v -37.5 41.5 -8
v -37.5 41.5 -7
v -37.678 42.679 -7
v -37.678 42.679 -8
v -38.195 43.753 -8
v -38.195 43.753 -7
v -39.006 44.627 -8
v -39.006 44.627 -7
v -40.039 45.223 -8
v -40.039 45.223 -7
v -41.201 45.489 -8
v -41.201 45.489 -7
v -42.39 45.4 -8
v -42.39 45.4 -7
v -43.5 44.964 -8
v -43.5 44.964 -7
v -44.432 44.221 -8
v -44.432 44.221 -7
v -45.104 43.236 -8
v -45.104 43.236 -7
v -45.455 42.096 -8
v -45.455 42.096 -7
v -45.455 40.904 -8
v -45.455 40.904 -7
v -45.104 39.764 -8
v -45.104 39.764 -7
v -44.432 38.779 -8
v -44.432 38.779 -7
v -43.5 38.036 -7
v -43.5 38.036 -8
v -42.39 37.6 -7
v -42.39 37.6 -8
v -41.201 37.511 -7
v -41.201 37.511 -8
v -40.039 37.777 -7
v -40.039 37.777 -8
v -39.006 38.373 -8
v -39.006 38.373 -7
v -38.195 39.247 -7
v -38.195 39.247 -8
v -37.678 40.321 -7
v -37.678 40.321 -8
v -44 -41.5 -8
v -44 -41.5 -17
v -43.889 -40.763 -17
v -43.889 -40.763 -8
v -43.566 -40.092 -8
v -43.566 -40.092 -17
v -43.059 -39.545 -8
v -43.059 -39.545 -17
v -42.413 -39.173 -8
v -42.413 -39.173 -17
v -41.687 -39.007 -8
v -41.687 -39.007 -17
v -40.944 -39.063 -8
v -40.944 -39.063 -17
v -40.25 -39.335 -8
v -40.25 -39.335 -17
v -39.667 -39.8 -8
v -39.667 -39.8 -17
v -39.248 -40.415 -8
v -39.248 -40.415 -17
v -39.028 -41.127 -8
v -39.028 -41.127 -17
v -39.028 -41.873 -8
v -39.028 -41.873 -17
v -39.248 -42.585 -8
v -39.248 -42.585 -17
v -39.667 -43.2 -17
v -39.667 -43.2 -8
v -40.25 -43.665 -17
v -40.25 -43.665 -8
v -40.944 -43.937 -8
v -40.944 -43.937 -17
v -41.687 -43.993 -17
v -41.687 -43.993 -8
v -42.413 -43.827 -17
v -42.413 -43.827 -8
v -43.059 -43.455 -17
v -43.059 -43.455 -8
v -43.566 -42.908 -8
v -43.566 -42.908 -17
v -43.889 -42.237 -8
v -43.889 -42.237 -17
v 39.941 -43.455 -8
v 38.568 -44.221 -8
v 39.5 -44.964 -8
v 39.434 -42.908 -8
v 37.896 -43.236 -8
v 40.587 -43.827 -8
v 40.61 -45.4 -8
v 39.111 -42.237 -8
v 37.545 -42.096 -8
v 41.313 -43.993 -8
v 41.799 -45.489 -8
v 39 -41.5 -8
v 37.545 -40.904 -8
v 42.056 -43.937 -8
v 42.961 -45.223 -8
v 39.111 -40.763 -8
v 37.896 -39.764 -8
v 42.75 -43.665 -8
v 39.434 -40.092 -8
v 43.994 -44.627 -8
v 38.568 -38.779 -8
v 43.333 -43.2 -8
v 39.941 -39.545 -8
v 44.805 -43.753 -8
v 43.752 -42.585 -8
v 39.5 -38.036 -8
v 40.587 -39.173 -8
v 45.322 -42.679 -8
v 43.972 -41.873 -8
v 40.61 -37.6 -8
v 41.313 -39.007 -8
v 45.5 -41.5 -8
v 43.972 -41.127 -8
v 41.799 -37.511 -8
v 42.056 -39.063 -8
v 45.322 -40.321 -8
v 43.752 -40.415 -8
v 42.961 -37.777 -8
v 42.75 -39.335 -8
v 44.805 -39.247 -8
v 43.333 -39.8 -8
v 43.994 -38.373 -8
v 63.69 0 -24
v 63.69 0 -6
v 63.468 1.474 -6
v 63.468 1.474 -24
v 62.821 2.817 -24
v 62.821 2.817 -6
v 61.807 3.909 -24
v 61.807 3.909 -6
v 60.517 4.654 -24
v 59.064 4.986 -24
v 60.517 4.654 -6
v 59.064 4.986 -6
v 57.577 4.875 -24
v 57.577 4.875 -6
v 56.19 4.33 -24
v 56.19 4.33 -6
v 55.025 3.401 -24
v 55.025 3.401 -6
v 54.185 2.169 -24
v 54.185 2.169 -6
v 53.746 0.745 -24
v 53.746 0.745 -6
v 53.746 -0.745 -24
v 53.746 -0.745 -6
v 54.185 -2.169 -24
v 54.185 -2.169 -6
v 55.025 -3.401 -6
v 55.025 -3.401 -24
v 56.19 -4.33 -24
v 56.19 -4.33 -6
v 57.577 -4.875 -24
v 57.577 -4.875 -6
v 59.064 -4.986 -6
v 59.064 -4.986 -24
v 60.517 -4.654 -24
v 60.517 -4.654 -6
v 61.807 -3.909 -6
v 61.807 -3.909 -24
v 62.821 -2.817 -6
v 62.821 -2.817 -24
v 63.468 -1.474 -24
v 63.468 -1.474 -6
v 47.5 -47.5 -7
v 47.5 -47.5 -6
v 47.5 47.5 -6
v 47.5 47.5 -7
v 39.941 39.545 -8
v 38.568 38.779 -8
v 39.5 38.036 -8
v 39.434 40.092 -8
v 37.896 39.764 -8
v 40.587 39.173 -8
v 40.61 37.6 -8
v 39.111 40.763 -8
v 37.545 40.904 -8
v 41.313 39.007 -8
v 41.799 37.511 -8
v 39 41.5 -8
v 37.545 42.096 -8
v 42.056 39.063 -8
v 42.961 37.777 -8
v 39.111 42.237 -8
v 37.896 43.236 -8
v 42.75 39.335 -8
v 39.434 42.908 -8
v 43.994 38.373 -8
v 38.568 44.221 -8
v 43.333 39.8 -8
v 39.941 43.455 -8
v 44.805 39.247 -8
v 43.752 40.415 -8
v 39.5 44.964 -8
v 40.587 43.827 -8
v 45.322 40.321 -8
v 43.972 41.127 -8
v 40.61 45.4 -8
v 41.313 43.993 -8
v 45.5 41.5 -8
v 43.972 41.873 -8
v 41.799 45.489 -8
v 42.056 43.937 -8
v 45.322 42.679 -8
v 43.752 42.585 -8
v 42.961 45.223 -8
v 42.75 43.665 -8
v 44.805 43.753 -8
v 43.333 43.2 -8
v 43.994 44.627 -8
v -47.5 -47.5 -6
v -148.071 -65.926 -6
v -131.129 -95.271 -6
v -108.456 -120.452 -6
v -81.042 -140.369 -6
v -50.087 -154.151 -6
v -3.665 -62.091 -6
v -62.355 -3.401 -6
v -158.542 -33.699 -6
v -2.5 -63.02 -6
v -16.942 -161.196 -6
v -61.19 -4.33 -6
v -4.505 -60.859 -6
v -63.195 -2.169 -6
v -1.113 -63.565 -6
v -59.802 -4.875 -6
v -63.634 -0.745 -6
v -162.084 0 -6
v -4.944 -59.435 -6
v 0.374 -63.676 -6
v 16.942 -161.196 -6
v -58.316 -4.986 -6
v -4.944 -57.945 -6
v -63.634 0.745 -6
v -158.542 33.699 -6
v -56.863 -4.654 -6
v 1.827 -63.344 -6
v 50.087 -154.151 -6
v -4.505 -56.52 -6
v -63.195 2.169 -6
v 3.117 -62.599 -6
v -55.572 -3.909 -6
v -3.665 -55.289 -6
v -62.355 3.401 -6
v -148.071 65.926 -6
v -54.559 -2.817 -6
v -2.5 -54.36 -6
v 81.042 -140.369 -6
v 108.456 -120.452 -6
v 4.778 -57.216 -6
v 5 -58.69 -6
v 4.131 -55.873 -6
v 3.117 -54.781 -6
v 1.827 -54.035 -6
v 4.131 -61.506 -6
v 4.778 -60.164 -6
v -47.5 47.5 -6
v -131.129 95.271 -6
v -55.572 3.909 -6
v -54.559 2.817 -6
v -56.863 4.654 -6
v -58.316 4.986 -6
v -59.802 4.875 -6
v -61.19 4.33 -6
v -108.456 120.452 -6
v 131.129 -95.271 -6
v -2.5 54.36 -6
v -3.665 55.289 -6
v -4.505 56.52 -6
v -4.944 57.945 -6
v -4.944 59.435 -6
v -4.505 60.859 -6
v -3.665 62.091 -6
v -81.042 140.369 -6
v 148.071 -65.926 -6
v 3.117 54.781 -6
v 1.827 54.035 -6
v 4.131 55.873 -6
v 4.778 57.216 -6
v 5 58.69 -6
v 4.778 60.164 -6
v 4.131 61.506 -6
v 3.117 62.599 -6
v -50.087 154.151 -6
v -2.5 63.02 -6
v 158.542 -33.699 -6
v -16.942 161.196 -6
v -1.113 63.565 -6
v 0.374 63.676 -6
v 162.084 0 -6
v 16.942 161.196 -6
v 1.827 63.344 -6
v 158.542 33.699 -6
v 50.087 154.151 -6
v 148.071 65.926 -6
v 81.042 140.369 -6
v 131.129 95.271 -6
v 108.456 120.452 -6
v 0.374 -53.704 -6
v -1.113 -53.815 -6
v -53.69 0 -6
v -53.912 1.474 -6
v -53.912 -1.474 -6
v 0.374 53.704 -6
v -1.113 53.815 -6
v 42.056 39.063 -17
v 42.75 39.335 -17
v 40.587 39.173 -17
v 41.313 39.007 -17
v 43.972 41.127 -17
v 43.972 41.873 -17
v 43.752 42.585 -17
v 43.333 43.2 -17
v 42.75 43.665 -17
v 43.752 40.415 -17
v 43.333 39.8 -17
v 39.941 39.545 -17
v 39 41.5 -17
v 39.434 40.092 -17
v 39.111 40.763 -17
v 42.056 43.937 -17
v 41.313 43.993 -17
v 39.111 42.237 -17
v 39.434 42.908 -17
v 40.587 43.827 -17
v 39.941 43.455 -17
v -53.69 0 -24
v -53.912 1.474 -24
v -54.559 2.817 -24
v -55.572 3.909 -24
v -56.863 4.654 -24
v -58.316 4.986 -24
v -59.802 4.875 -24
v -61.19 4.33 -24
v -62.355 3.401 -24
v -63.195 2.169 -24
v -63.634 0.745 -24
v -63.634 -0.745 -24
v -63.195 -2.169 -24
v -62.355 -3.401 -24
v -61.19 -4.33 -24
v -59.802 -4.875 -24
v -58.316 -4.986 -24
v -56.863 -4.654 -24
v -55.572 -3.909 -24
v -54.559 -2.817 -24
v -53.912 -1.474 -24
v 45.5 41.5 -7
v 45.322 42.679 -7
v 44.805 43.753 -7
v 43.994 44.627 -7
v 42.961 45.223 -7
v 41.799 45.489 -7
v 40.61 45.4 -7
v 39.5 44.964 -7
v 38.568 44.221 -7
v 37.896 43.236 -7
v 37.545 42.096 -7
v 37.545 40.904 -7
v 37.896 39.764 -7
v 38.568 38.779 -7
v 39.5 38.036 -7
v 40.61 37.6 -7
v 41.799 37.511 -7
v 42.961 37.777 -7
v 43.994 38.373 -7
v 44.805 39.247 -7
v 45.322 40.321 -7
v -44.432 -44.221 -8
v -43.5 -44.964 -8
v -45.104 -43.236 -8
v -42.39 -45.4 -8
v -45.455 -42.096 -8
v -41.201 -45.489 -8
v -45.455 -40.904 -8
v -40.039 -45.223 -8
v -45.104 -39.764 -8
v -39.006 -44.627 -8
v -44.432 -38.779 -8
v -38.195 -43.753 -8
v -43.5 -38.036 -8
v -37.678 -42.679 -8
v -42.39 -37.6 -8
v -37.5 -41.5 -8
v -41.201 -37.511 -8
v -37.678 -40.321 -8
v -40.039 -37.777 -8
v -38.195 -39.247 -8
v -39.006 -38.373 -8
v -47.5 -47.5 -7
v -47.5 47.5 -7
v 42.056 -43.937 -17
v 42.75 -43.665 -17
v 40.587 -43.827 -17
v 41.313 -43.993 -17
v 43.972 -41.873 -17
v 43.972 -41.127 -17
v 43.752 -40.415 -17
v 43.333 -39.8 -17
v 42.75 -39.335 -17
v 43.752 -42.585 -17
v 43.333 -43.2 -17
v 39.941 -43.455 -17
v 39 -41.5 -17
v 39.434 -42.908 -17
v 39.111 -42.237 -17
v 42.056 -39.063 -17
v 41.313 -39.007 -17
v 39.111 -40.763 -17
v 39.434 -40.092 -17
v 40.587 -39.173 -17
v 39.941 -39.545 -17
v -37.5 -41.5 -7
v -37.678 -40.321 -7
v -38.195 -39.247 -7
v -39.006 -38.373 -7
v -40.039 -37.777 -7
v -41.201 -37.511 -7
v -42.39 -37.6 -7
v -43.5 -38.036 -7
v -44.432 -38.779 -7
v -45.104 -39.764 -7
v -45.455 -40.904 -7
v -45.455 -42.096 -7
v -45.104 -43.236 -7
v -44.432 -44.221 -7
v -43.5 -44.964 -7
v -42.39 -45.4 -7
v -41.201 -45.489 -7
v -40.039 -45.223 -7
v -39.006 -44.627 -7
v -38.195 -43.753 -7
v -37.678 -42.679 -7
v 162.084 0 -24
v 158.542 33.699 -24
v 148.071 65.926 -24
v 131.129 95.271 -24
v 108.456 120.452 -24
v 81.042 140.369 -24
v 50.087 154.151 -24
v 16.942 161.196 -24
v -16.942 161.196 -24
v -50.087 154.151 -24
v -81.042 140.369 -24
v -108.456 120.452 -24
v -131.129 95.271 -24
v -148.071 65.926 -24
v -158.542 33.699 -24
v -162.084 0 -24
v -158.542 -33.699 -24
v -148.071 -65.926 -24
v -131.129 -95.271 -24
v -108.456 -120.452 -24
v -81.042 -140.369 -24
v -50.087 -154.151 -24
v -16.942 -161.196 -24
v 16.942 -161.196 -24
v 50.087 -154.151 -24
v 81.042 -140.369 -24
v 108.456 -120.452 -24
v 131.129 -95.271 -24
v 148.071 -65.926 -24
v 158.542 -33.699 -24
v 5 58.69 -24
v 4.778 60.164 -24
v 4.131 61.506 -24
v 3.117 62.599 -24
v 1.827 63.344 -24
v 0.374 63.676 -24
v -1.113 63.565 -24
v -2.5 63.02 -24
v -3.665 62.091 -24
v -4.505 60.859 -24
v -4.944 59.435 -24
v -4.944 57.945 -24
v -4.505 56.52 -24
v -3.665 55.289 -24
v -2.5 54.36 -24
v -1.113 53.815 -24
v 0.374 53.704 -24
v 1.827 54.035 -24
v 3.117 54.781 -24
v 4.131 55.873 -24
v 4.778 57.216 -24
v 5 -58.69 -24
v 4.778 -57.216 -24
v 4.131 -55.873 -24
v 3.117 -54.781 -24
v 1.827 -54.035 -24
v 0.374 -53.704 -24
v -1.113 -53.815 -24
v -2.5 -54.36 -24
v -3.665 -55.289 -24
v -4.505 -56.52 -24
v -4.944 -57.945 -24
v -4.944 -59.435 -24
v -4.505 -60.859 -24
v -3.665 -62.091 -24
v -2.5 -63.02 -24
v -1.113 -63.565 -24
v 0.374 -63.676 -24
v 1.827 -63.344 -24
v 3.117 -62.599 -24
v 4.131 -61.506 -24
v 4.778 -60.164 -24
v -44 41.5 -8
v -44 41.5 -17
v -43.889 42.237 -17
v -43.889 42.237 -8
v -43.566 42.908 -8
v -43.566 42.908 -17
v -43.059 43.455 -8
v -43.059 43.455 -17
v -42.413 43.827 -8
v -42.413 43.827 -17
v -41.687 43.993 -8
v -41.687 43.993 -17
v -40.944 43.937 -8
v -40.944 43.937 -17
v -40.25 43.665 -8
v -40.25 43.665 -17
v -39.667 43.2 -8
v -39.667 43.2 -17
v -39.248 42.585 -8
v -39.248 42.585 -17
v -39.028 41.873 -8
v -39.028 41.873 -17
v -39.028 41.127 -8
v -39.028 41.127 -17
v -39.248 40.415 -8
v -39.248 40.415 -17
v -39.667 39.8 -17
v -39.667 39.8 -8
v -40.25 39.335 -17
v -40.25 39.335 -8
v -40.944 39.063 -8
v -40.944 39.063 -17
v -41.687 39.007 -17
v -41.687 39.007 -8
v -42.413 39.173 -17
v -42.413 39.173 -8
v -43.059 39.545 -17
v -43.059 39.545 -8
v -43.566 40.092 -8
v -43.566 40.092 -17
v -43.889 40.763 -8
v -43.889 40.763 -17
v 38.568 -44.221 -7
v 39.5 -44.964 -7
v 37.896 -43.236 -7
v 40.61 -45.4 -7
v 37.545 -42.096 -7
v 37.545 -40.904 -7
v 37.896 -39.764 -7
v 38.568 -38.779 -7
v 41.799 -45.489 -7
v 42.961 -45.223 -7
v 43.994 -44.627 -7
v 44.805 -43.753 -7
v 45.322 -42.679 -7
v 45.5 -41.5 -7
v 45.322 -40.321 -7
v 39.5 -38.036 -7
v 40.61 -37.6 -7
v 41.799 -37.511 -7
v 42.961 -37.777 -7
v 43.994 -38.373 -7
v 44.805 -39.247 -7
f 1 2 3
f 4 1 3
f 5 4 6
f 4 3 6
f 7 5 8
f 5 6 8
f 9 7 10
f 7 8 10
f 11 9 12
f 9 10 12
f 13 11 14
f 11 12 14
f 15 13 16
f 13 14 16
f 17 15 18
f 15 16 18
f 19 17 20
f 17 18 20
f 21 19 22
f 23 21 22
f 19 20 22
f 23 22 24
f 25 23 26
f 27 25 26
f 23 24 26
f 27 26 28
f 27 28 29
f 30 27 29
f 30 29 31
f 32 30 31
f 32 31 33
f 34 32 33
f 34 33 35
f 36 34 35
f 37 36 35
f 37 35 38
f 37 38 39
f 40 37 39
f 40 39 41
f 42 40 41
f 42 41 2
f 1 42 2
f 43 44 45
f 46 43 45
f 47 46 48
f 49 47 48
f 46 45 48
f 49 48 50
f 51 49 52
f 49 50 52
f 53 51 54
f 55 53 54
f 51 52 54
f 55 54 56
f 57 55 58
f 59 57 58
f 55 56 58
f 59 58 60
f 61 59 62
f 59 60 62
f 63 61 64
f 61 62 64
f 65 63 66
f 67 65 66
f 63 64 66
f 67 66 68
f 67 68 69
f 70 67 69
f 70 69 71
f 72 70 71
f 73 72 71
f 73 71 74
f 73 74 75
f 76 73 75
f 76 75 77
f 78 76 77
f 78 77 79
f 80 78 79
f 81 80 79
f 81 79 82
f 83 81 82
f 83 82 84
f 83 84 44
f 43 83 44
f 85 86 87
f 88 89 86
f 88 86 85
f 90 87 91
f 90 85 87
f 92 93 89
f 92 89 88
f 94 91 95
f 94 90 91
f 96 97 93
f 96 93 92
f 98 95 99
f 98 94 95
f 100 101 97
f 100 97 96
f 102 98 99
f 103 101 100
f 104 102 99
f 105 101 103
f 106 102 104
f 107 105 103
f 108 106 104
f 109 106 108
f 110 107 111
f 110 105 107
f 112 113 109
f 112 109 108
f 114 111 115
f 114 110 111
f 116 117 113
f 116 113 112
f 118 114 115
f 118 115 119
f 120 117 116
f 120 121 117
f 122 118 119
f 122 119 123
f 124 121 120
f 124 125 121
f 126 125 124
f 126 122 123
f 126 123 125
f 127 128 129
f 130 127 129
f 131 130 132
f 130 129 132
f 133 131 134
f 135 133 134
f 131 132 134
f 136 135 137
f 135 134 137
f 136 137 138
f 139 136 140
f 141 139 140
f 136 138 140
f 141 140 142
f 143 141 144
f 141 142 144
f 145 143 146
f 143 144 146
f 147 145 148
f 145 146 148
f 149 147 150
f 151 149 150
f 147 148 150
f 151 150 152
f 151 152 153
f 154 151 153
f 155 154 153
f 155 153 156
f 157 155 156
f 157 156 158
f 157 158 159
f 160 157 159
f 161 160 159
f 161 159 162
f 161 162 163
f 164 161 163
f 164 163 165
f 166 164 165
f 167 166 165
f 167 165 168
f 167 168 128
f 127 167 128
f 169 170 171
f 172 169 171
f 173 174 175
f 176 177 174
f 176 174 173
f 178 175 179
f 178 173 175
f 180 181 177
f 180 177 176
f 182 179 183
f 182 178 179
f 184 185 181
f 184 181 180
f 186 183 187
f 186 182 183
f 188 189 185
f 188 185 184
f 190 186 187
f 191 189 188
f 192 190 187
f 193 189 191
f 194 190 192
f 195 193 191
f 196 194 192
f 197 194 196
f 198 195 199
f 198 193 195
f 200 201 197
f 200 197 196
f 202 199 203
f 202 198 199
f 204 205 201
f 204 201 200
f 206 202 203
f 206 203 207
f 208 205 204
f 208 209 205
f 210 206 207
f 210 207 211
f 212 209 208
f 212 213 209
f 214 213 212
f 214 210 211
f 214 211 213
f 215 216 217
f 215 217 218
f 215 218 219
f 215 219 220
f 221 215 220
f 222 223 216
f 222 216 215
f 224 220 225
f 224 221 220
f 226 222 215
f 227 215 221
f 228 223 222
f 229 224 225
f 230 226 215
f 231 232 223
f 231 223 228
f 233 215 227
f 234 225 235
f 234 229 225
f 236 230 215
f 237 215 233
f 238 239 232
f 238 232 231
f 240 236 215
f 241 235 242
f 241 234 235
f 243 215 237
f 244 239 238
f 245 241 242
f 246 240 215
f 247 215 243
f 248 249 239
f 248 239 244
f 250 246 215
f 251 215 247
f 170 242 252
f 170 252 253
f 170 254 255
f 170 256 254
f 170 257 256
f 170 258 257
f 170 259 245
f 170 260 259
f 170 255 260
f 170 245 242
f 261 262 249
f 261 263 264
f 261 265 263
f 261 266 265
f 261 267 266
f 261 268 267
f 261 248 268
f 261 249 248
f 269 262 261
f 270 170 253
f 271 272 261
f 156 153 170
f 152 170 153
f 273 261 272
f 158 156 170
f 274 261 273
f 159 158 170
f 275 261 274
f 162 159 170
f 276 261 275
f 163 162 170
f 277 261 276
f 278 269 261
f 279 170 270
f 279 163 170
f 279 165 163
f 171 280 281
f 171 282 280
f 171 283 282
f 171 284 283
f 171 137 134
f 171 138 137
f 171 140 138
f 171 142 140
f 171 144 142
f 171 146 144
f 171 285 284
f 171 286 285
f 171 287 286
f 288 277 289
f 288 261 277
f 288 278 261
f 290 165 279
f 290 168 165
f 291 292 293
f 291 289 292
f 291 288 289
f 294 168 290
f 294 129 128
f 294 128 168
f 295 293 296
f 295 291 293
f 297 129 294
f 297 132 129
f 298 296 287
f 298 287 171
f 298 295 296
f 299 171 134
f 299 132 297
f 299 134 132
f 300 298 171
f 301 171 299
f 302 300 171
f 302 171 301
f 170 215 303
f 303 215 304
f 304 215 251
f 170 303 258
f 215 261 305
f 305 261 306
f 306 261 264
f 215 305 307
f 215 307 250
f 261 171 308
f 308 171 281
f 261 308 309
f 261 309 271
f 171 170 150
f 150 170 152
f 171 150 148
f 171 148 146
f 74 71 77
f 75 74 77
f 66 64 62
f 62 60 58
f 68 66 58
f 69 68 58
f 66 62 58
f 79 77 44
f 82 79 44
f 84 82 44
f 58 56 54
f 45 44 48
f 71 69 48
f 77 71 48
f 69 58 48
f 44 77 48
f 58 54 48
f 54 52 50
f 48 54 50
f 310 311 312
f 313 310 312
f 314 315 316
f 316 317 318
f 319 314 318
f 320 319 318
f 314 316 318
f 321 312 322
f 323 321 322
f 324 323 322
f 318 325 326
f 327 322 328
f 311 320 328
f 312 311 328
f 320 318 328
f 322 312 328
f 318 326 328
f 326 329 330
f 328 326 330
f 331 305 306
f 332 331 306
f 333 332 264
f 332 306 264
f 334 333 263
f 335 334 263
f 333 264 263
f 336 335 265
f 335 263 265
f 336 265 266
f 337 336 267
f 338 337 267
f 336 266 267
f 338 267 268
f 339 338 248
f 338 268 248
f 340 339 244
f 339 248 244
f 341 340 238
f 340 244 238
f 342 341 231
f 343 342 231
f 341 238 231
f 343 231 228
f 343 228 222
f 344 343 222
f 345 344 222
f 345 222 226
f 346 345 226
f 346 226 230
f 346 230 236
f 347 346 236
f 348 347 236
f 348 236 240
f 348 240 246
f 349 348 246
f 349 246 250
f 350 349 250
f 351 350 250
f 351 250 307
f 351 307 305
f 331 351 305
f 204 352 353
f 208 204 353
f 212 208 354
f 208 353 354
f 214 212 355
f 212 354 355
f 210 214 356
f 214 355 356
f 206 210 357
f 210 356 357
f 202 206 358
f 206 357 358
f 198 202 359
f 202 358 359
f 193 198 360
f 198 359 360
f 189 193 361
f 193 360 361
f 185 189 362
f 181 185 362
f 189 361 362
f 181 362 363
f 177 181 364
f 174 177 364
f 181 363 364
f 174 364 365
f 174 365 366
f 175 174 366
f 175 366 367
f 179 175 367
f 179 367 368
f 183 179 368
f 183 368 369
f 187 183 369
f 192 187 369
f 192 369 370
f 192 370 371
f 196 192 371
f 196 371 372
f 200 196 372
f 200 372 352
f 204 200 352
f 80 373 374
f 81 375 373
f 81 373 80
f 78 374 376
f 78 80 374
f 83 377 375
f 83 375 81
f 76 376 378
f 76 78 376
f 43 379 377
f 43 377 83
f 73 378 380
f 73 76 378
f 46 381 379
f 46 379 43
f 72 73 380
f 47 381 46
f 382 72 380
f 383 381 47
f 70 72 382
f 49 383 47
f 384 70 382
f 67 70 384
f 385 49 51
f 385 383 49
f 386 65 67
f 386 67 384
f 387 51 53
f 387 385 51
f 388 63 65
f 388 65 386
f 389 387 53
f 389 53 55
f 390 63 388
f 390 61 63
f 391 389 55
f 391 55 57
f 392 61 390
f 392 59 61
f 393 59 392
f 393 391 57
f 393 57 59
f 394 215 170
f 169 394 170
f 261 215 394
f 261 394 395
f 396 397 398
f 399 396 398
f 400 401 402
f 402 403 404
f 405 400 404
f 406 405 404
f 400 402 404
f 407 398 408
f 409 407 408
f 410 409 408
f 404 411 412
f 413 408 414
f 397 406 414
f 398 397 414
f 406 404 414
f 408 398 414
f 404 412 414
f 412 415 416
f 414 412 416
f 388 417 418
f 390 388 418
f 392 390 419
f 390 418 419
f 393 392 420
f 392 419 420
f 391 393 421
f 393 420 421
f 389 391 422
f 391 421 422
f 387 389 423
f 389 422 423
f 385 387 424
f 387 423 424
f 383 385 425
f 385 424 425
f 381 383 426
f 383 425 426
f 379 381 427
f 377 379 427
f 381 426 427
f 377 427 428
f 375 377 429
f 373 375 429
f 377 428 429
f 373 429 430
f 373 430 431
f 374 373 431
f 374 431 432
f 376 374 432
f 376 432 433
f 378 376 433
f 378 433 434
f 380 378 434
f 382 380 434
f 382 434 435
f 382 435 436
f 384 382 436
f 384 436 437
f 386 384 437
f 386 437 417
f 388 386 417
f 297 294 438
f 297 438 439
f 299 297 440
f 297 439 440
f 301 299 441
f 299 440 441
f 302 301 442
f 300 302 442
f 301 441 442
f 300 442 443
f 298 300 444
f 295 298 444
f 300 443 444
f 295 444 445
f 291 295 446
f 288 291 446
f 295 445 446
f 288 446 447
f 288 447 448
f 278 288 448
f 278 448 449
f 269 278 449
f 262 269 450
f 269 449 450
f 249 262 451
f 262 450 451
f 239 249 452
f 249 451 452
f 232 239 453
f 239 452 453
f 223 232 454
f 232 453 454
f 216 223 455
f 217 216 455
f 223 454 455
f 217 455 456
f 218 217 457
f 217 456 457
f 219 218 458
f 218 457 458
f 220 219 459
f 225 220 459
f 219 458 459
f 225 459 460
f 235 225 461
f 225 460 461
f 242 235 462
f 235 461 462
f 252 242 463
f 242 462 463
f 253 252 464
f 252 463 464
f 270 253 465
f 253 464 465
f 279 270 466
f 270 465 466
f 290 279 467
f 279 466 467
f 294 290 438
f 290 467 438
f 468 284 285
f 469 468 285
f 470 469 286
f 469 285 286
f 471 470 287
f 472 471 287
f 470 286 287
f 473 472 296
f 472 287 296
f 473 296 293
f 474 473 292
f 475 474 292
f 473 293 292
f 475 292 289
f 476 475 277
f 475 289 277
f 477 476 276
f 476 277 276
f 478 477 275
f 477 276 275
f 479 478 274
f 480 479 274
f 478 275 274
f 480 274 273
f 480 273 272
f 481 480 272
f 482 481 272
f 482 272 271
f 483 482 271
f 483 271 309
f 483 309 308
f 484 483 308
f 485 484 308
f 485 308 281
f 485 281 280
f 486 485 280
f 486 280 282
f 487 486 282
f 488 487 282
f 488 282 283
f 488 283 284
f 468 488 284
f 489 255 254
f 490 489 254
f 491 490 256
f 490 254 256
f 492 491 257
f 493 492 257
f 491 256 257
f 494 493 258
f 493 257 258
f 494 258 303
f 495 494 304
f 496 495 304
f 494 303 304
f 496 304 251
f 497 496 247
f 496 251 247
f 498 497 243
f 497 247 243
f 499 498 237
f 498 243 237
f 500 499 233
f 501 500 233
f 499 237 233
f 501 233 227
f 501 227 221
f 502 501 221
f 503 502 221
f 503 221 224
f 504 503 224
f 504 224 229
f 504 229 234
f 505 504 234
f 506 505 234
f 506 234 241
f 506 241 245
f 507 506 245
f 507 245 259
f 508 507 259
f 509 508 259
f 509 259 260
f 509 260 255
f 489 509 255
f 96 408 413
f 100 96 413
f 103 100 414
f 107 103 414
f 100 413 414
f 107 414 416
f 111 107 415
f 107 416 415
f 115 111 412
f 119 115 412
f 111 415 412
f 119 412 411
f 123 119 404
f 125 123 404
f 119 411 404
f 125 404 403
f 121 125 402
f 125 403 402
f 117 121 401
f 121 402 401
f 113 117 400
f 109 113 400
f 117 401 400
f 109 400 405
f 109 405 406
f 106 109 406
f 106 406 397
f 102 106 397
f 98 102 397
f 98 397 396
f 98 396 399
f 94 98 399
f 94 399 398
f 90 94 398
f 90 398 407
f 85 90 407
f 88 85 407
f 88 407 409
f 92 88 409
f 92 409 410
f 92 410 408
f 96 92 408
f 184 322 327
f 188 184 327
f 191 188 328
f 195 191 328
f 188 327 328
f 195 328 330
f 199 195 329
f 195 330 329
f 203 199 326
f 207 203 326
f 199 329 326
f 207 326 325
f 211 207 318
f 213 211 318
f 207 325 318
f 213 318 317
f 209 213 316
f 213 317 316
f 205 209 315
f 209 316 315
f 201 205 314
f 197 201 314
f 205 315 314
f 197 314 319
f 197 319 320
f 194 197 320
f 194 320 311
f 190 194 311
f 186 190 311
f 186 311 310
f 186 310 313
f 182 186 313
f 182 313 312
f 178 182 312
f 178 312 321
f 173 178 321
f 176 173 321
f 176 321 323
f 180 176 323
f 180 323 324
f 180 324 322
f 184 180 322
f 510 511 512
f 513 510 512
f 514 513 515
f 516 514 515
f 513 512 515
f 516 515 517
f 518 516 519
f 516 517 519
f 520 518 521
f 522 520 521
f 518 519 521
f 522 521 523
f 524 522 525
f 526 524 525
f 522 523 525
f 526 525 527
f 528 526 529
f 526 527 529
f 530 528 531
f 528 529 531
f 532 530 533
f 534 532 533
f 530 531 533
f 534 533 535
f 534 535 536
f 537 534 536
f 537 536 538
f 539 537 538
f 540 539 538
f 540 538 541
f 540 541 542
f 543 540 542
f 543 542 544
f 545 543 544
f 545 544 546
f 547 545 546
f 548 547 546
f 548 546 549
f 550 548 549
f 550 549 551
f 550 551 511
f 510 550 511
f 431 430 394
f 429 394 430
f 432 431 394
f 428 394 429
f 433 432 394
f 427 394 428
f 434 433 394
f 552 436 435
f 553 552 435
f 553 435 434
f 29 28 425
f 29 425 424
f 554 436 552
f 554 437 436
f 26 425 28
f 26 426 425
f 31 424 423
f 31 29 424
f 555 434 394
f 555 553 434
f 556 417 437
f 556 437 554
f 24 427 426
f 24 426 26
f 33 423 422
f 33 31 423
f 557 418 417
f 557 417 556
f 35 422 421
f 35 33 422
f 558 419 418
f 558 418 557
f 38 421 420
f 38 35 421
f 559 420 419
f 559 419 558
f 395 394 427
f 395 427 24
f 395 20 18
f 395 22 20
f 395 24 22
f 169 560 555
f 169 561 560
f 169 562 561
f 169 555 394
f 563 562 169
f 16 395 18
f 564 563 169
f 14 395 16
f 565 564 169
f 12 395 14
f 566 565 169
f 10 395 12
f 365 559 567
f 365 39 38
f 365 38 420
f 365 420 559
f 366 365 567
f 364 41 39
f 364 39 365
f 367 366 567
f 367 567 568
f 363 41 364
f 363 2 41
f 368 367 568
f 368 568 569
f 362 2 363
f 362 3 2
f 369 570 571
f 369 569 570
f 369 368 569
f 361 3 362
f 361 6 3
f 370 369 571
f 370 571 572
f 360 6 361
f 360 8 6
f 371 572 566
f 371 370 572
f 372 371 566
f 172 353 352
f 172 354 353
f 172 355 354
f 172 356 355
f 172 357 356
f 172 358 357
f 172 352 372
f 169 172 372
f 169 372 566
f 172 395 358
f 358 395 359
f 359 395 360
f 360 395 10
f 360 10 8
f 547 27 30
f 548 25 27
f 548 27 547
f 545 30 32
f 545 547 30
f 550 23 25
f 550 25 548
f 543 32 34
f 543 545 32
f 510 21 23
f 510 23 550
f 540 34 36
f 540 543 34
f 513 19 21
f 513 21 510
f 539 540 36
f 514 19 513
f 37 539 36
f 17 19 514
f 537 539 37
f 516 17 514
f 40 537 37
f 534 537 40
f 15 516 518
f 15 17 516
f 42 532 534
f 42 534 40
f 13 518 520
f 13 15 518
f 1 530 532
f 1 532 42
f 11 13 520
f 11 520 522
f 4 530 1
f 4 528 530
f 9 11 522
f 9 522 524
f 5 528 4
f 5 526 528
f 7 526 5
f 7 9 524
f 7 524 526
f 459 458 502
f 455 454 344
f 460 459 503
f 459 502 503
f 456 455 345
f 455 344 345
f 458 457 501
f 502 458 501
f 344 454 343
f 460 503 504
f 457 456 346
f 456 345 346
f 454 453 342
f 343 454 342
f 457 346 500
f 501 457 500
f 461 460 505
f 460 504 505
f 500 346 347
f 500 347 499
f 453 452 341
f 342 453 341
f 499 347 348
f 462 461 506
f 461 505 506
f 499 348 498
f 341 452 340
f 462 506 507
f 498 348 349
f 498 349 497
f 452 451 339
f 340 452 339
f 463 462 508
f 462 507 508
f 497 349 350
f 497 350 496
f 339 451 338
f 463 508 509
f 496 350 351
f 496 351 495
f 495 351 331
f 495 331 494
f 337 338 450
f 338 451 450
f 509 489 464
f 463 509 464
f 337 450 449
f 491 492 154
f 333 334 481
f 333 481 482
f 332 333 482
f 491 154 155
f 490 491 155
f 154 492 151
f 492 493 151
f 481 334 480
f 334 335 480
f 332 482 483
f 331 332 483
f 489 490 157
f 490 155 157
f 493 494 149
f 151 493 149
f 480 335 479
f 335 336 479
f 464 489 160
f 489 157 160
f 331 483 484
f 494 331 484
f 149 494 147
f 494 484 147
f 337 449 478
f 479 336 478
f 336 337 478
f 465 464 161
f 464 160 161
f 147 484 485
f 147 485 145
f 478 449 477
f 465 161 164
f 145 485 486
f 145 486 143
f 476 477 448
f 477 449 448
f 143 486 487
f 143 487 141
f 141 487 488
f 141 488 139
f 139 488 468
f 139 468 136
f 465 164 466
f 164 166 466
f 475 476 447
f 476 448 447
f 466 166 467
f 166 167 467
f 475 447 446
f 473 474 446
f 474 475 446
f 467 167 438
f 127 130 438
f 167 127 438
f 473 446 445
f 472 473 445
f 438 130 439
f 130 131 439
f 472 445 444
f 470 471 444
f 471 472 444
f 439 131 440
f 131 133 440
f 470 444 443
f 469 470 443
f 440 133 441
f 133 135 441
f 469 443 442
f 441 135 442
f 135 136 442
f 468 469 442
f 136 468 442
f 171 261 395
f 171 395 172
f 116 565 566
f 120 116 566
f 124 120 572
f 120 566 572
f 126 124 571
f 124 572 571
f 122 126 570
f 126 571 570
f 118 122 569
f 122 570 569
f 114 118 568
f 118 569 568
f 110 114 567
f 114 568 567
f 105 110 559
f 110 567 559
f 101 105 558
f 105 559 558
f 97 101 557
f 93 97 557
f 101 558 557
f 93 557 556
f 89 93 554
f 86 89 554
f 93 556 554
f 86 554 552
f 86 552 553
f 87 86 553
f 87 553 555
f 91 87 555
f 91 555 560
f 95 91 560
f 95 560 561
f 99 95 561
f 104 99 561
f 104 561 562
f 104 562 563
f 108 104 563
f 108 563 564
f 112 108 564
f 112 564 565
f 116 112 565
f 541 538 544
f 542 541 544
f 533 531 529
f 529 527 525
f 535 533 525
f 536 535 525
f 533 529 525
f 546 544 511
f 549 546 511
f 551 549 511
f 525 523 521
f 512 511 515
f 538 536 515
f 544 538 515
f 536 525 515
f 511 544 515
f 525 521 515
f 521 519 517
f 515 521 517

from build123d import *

# Parameters (mm, degrees)
SKETCH003_R      = 162.0844056183
PAD002_DEPTH     = 18
SKETCH009_W      = 95
SKETCH009_H      = 95
POCKET002_DEPTH  = 1
HOLE_D           = 5
HOLE_DEPTH       = 10
HOLE_CBORE_D     = 8
HOLE_CBORE_DEPTH = 1
SKETCH011_R      = 5
POCKET003_DEPTH  = 18.001


with BuildPart() as part:
    # Sketch003 → Pad002 (new body)
    with BuildSketch(Plane.XY):
        Circle(SKETCH003_R)
    extrude(amount=PAD002_DEPTH)

    # Sketch009 (on Face3 of Pad002) → Pocket002 (cut)
    with BuildSketch(Plane.XY.offset(18)):
        Rectangle(SKETCH009_W, SKETCH009_H)
    extrude(amount=-POCKET002_DEPTH, mode=Mode.SUBTRACT)

    # Hole
    with Locations(Plane.XY.offset(17)):
        with Locations((-41.5, 41.5), (41.5, 41.5), (-41.5, -41.5), (41.5, -41.5)):
            CounterBoreHole(HOLE_D / 2, HOLE_CBORE_D / 2, HOLE_CBORE_DEPTH, depth=HOLE_DEPTH)

    # Sketch011 (on Face3 of Hole) → Pocket003 (cut, through all)
    with BuildSketch(Plane.XY.offset(18)):
        with Locations((-58.6898628385, 0)):
            Circle(SKETCH011_R)
        with Locations((0, 58.6898628385)):
            Circle(SKETCH011_R)
        with Locations((58.6898628385, 0)):
            Circle(SKETCH011_R)
        with Locations((0, -58.6898628385)):
            Circle(SKETCH011_R)
    extrude(amount=-POCKET003_DEPTH, mode=Mode.SUBTRACT)


with BuildPart() as part_1:
    # Clone004 placement: moved
    add(part.part.moved(Location((0, 0, -24))))


solid = part_1.part
